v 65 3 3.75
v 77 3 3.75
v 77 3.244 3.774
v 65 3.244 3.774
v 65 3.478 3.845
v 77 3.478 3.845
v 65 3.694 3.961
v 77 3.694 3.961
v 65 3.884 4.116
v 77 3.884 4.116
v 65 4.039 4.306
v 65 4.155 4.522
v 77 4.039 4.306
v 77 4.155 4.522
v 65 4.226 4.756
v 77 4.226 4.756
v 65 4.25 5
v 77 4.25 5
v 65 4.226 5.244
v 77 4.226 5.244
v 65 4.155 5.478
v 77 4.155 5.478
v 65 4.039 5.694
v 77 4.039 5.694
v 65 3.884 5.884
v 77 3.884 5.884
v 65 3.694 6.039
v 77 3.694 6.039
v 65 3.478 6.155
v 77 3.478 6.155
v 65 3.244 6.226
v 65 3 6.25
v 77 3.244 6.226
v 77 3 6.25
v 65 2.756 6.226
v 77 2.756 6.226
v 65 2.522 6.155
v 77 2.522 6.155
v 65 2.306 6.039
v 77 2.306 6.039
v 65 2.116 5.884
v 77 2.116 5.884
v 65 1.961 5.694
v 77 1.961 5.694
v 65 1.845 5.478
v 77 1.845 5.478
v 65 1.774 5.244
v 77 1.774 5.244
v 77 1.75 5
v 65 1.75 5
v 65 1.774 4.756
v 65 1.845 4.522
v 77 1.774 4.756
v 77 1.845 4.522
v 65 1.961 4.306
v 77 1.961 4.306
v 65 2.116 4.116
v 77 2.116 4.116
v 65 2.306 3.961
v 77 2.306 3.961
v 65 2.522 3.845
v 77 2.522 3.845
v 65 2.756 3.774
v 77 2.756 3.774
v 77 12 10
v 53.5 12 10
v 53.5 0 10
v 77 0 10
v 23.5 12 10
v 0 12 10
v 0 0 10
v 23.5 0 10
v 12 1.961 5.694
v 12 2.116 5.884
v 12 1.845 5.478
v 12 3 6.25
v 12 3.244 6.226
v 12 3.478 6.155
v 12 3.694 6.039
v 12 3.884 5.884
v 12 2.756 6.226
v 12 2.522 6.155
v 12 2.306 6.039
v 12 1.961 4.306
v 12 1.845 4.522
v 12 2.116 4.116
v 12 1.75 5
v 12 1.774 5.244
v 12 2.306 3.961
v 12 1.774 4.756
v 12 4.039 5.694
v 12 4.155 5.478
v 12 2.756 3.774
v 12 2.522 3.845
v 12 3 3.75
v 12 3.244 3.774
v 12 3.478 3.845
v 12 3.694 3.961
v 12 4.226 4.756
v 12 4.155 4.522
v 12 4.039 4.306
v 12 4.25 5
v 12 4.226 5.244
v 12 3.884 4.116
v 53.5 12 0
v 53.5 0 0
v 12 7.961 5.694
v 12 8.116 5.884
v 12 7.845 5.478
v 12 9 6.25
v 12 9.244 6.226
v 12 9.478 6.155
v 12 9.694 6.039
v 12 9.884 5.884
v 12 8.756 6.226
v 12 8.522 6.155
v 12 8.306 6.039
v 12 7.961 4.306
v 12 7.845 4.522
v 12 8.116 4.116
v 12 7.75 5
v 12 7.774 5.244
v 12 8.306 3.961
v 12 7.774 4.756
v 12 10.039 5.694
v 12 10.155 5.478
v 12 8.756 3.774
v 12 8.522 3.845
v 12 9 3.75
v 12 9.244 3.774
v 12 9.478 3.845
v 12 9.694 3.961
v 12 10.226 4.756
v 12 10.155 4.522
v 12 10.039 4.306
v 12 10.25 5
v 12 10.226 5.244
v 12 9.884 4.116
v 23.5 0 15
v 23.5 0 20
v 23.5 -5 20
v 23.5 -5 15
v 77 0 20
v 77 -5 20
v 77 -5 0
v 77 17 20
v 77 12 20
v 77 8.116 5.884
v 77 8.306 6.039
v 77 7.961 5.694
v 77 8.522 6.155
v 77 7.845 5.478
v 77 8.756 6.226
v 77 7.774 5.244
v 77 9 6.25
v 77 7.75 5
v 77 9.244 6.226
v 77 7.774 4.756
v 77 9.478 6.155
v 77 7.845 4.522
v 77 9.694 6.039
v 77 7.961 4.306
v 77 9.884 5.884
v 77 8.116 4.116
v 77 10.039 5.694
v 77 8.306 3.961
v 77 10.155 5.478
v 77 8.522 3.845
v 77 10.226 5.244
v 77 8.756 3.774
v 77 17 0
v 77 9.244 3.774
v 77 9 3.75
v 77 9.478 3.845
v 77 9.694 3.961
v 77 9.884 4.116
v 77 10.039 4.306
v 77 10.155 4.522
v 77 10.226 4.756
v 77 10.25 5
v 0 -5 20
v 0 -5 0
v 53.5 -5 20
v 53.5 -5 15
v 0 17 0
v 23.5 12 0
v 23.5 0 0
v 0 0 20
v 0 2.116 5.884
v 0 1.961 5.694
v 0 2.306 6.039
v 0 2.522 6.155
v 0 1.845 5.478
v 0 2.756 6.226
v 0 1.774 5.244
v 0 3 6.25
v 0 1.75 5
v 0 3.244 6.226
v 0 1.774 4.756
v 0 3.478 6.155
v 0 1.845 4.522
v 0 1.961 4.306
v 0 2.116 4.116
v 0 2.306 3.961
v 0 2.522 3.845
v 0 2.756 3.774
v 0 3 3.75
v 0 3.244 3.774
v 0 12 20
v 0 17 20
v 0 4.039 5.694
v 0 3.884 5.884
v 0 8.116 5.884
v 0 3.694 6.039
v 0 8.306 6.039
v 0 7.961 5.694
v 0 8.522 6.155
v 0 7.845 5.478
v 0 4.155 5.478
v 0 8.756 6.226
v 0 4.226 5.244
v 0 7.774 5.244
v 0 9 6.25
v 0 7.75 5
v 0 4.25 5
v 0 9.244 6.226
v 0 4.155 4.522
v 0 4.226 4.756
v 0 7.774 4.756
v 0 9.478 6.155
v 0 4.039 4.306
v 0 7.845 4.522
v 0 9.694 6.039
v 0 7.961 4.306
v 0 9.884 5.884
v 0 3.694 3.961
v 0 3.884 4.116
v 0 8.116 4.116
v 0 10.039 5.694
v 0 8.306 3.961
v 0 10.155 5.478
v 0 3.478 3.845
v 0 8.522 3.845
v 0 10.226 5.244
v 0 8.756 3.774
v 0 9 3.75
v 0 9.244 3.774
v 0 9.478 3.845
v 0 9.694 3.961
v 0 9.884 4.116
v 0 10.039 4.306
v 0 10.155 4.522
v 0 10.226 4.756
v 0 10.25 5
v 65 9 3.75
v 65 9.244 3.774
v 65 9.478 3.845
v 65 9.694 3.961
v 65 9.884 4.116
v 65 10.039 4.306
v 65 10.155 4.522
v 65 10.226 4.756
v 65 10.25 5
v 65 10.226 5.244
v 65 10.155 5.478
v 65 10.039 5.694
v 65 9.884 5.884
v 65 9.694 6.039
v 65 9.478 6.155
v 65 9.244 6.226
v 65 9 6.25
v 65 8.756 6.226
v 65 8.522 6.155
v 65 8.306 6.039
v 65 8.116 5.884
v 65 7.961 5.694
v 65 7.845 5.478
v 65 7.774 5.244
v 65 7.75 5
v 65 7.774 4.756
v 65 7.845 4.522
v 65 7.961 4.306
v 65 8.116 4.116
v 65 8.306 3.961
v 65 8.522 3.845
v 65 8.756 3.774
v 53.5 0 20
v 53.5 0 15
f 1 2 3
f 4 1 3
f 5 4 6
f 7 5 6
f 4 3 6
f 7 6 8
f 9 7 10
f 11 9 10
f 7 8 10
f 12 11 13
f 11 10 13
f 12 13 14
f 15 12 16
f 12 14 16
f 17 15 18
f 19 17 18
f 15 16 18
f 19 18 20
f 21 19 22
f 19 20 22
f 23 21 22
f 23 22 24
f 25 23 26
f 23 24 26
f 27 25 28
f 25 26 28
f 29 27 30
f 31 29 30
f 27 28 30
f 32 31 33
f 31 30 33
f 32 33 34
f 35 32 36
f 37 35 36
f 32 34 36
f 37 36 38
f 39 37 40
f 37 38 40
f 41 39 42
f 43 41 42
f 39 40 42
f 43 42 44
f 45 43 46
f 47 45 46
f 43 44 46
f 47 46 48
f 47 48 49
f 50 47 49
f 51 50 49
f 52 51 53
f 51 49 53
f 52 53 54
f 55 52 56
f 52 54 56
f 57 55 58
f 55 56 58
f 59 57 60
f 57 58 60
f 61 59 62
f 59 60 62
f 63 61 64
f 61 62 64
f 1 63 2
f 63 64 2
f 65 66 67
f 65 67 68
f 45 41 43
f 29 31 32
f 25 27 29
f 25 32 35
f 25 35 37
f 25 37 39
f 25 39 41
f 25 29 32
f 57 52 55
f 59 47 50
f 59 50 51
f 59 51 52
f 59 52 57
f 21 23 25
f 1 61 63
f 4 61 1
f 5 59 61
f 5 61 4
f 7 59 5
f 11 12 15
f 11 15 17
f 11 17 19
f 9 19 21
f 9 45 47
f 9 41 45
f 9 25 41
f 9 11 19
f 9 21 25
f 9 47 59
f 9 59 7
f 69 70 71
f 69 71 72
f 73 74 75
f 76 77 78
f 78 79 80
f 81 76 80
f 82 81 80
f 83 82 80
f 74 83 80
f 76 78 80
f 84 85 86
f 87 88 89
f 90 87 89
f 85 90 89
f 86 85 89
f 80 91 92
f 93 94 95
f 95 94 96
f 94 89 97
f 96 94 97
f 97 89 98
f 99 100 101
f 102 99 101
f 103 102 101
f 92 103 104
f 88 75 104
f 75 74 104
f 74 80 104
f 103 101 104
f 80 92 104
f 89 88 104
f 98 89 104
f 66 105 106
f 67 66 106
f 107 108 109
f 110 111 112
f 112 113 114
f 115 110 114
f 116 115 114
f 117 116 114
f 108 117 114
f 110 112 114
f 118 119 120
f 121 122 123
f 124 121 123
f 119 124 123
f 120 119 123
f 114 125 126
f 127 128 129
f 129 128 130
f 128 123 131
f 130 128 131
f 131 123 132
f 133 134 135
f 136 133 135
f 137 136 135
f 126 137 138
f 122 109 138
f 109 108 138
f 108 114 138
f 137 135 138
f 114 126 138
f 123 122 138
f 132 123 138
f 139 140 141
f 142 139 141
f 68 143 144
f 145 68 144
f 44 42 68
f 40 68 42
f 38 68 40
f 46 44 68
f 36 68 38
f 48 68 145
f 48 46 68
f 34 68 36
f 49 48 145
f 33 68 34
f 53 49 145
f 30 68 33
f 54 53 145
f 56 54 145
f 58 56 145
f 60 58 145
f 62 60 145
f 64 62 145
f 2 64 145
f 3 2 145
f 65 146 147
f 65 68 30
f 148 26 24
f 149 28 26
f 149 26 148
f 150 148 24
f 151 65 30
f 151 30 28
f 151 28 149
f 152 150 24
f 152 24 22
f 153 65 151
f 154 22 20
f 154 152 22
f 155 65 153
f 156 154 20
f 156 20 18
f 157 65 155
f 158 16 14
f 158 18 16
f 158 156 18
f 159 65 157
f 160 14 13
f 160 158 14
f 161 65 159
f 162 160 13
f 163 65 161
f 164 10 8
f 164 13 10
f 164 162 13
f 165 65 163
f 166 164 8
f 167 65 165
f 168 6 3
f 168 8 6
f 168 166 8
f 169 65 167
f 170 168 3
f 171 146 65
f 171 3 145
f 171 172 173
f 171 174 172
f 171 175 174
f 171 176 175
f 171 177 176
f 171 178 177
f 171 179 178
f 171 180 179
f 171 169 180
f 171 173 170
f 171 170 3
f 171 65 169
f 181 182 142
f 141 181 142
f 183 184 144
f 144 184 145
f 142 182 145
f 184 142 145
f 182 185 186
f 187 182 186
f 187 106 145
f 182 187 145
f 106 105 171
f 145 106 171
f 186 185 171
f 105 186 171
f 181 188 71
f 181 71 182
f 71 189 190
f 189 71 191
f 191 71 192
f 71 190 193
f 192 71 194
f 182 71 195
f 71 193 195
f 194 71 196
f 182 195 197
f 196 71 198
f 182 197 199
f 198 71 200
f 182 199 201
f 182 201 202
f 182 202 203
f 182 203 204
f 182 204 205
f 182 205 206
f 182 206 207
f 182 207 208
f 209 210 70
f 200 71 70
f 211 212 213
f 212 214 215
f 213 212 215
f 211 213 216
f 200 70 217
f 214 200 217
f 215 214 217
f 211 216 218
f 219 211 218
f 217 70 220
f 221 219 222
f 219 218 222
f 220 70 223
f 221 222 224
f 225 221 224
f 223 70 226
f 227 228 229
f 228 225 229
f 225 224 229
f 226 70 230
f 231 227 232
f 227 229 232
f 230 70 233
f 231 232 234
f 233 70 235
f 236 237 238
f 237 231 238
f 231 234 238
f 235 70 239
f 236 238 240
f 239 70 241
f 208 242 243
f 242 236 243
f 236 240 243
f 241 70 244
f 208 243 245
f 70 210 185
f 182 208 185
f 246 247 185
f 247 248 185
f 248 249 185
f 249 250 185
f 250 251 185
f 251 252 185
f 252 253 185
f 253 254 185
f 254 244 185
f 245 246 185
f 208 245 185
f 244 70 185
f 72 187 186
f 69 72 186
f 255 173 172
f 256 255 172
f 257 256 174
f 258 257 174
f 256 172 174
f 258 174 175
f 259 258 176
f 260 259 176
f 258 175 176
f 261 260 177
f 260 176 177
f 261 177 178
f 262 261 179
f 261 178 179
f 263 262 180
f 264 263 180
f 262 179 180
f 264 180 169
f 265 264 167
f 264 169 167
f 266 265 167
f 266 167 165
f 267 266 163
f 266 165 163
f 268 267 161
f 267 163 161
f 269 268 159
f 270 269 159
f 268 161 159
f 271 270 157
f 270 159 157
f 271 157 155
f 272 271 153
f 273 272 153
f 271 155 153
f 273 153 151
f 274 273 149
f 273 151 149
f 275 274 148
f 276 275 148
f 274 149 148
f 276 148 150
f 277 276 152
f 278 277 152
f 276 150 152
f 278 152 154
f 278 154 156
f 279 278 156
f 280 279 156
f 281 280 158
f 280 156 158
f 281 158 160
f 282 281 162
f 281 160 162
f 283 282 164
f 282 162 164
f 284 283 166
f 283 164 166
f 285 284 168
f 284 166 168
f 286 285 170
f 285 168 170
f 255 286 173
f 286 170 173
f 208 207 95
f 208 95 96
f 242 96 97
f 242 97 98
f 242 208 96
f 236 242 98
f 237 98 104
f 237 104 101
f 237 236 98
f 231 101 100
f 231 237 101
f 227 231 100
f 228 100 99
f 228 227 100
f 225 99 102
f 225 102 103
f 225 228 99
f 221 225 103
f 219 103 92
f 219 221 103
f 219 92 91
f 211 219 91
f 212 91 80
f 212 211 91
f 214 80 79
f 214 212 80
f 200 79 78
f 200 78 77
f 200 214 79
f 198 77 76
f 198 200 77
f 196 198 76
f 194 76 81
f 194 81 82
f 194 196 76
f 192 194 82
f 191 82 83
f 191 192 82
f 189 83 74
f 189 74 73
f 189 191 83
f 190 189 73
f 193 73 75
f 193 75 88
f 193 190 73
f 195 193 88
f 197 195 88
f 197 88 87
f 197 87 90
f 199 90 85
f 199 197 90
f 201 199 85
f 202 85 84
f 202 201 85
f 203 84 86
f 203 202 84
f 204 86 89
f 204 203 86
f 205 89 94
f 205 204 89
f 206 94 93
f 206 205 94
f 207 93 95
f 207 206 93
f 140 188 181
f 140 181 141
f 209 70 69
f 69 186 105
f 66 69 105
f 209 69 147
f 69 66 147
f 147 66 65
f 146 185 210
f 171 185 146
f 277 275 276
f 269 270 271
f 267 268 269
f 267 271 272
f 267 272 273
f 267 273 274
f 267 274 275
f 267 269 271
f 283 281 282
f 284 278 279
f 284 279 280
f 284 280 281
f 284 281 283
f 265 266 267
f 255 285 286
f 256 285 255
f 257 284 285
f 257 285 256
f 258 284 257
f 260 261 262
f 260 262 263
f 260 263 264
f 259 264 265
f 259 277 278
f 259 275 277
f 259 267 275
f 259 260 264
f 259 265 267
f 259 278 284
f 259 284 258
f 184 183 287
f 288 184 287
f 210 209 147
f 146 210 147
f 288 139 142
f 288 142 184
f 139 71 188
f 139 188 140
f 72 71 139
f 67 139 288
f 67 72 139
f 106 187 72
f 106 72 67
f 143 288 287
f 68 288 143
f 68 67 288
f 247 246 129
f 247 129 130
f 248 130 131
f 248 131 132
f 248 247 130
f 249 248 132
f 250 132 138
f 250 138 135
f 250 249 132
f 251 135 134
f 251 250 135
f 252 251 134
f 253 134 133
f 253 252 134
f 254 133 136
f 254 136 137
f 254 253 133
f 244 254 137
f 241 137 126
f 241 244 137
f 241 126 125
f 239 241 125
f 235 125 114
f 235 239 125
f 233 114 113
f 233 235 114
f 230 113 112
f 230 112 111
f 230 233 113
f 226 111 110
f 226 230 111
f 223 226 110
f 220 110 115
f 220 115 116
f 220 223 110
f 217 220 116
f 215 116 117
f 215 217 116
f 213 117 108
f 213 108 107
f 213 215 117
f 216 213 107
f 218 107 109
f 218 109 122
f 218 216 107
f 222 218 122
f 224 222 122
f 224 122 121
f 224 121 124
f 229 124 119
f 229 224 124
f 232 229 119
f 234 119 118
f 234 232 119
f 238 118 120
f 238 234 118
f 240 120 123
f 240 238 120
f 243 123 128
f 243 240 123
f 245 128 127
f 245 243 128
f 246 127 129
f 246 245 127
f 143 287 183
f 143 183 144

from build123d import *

# Parameters (mm, degrees)
SKETCH1_W           = 77
SKETCH1_H           = 12
BOSS_EXTRUDE1_DEPTH = 10
SKETCH2_R           = 1.25
CUT_EXTRUDE1_DEPTH  = 12
SKETCH3_W           = 77
SKETCH3_H           = 20
BOSS_EXTRUDE2_DEPTH = 5
SKETCH4_W           = 30
SKETCH4_H           = 6
CUT_EXTRUDE2_DEPTH  = 10
SKETCH5_W           = 30
SKETCH5_H           = 2.5
CUT_EXTRUDE3_DEPTH  = 5


with BuildPart() as part:
    # Sketch1 → Boss-Extrude1 (new body)
    with BuildSketch(Plane.XY):
        with Locations((38.5, 6)):
            Rectangle(SKETCH1_W, SKETCH1_H)
    extrude(amount=BOSS_EXTRUDE1_DEPTH)

    # Sketch2 → Cut-Extrude1 (cut)
    with BuildSketch(Plane(origin=(77, 0, 0), x_dir=(0, 0, -1), z_dir=(1, 0, 0))):
        with Locations((-5, 3)):
            Circle(SKETCH2_R)
        with Locations((-5, 9)):
            Circle(SKETCH2_R)
    cut_extrude1 = extrude(amount=-CUT_EXTRUDE1_DEPTH, mode=Mode.SUBTRACT)

    # Mirror1: Cut-Extrude1 across plane
    add(cut_extrude1.mirror(Plane.ZY.offset(-38.5)), mode=Mode.SUBTRACT)

    # Sketch3 → Boss-Extrude2 (add)
    with BuildSketch(Plane(origin=(0, 12, 0), x_dir=(1, 0, 0), z_dir=(0, 1, 0))):
        with Locations((38.5, -10)):
            Rectangle(SKETCH3_W, SKETCH3_H)
    boss_extrude2 = extrude(amount=BOSS_EXTRUDE2_DEPTH)

    # Mirror2: Boss-Extrude2 across plane
    add(boss_extrude2.mirror(Plane(origin=(0, 6, 0), x_dir=(0, 0, 1), z_dir=(0, -1, 0))))

    # Sketch4 → Cut-Extrude2 (cut)
    with BuildSketch(Plane(origin=(0, 0, 0), x_dir=(-1, 0, 0), z_dir=(0, 0, -1))):
        with Locations((-38.5, 9)):
            Rectangle(SKETCH4_W, SKETCH4_H)
        with Locations((-38.5, 3)):
            Rectangle(SKETCH4_W, SKETCH4_H)
    extrude(amount=-CUT_EXTRUDE2_DEPTH, mode=Mode.SUBTRACT)

    # Sketch5 → Cut-Extrude3 (cut)
    with BuildSketch(Plane.XY.offset(20)):
        with Locations((38.5, -1.25)):
            Rectangle(SKETCH5_W, SKETCH5_H)
        with Locations((38.5, -3.75)):
            Rectangle(SKETCH5_W, SKETCH5_H)
    extrude(amount=-CUT_EXTRUDE3_DEPTH, mode=Mode.SUBTRACT)


solid = part.part
